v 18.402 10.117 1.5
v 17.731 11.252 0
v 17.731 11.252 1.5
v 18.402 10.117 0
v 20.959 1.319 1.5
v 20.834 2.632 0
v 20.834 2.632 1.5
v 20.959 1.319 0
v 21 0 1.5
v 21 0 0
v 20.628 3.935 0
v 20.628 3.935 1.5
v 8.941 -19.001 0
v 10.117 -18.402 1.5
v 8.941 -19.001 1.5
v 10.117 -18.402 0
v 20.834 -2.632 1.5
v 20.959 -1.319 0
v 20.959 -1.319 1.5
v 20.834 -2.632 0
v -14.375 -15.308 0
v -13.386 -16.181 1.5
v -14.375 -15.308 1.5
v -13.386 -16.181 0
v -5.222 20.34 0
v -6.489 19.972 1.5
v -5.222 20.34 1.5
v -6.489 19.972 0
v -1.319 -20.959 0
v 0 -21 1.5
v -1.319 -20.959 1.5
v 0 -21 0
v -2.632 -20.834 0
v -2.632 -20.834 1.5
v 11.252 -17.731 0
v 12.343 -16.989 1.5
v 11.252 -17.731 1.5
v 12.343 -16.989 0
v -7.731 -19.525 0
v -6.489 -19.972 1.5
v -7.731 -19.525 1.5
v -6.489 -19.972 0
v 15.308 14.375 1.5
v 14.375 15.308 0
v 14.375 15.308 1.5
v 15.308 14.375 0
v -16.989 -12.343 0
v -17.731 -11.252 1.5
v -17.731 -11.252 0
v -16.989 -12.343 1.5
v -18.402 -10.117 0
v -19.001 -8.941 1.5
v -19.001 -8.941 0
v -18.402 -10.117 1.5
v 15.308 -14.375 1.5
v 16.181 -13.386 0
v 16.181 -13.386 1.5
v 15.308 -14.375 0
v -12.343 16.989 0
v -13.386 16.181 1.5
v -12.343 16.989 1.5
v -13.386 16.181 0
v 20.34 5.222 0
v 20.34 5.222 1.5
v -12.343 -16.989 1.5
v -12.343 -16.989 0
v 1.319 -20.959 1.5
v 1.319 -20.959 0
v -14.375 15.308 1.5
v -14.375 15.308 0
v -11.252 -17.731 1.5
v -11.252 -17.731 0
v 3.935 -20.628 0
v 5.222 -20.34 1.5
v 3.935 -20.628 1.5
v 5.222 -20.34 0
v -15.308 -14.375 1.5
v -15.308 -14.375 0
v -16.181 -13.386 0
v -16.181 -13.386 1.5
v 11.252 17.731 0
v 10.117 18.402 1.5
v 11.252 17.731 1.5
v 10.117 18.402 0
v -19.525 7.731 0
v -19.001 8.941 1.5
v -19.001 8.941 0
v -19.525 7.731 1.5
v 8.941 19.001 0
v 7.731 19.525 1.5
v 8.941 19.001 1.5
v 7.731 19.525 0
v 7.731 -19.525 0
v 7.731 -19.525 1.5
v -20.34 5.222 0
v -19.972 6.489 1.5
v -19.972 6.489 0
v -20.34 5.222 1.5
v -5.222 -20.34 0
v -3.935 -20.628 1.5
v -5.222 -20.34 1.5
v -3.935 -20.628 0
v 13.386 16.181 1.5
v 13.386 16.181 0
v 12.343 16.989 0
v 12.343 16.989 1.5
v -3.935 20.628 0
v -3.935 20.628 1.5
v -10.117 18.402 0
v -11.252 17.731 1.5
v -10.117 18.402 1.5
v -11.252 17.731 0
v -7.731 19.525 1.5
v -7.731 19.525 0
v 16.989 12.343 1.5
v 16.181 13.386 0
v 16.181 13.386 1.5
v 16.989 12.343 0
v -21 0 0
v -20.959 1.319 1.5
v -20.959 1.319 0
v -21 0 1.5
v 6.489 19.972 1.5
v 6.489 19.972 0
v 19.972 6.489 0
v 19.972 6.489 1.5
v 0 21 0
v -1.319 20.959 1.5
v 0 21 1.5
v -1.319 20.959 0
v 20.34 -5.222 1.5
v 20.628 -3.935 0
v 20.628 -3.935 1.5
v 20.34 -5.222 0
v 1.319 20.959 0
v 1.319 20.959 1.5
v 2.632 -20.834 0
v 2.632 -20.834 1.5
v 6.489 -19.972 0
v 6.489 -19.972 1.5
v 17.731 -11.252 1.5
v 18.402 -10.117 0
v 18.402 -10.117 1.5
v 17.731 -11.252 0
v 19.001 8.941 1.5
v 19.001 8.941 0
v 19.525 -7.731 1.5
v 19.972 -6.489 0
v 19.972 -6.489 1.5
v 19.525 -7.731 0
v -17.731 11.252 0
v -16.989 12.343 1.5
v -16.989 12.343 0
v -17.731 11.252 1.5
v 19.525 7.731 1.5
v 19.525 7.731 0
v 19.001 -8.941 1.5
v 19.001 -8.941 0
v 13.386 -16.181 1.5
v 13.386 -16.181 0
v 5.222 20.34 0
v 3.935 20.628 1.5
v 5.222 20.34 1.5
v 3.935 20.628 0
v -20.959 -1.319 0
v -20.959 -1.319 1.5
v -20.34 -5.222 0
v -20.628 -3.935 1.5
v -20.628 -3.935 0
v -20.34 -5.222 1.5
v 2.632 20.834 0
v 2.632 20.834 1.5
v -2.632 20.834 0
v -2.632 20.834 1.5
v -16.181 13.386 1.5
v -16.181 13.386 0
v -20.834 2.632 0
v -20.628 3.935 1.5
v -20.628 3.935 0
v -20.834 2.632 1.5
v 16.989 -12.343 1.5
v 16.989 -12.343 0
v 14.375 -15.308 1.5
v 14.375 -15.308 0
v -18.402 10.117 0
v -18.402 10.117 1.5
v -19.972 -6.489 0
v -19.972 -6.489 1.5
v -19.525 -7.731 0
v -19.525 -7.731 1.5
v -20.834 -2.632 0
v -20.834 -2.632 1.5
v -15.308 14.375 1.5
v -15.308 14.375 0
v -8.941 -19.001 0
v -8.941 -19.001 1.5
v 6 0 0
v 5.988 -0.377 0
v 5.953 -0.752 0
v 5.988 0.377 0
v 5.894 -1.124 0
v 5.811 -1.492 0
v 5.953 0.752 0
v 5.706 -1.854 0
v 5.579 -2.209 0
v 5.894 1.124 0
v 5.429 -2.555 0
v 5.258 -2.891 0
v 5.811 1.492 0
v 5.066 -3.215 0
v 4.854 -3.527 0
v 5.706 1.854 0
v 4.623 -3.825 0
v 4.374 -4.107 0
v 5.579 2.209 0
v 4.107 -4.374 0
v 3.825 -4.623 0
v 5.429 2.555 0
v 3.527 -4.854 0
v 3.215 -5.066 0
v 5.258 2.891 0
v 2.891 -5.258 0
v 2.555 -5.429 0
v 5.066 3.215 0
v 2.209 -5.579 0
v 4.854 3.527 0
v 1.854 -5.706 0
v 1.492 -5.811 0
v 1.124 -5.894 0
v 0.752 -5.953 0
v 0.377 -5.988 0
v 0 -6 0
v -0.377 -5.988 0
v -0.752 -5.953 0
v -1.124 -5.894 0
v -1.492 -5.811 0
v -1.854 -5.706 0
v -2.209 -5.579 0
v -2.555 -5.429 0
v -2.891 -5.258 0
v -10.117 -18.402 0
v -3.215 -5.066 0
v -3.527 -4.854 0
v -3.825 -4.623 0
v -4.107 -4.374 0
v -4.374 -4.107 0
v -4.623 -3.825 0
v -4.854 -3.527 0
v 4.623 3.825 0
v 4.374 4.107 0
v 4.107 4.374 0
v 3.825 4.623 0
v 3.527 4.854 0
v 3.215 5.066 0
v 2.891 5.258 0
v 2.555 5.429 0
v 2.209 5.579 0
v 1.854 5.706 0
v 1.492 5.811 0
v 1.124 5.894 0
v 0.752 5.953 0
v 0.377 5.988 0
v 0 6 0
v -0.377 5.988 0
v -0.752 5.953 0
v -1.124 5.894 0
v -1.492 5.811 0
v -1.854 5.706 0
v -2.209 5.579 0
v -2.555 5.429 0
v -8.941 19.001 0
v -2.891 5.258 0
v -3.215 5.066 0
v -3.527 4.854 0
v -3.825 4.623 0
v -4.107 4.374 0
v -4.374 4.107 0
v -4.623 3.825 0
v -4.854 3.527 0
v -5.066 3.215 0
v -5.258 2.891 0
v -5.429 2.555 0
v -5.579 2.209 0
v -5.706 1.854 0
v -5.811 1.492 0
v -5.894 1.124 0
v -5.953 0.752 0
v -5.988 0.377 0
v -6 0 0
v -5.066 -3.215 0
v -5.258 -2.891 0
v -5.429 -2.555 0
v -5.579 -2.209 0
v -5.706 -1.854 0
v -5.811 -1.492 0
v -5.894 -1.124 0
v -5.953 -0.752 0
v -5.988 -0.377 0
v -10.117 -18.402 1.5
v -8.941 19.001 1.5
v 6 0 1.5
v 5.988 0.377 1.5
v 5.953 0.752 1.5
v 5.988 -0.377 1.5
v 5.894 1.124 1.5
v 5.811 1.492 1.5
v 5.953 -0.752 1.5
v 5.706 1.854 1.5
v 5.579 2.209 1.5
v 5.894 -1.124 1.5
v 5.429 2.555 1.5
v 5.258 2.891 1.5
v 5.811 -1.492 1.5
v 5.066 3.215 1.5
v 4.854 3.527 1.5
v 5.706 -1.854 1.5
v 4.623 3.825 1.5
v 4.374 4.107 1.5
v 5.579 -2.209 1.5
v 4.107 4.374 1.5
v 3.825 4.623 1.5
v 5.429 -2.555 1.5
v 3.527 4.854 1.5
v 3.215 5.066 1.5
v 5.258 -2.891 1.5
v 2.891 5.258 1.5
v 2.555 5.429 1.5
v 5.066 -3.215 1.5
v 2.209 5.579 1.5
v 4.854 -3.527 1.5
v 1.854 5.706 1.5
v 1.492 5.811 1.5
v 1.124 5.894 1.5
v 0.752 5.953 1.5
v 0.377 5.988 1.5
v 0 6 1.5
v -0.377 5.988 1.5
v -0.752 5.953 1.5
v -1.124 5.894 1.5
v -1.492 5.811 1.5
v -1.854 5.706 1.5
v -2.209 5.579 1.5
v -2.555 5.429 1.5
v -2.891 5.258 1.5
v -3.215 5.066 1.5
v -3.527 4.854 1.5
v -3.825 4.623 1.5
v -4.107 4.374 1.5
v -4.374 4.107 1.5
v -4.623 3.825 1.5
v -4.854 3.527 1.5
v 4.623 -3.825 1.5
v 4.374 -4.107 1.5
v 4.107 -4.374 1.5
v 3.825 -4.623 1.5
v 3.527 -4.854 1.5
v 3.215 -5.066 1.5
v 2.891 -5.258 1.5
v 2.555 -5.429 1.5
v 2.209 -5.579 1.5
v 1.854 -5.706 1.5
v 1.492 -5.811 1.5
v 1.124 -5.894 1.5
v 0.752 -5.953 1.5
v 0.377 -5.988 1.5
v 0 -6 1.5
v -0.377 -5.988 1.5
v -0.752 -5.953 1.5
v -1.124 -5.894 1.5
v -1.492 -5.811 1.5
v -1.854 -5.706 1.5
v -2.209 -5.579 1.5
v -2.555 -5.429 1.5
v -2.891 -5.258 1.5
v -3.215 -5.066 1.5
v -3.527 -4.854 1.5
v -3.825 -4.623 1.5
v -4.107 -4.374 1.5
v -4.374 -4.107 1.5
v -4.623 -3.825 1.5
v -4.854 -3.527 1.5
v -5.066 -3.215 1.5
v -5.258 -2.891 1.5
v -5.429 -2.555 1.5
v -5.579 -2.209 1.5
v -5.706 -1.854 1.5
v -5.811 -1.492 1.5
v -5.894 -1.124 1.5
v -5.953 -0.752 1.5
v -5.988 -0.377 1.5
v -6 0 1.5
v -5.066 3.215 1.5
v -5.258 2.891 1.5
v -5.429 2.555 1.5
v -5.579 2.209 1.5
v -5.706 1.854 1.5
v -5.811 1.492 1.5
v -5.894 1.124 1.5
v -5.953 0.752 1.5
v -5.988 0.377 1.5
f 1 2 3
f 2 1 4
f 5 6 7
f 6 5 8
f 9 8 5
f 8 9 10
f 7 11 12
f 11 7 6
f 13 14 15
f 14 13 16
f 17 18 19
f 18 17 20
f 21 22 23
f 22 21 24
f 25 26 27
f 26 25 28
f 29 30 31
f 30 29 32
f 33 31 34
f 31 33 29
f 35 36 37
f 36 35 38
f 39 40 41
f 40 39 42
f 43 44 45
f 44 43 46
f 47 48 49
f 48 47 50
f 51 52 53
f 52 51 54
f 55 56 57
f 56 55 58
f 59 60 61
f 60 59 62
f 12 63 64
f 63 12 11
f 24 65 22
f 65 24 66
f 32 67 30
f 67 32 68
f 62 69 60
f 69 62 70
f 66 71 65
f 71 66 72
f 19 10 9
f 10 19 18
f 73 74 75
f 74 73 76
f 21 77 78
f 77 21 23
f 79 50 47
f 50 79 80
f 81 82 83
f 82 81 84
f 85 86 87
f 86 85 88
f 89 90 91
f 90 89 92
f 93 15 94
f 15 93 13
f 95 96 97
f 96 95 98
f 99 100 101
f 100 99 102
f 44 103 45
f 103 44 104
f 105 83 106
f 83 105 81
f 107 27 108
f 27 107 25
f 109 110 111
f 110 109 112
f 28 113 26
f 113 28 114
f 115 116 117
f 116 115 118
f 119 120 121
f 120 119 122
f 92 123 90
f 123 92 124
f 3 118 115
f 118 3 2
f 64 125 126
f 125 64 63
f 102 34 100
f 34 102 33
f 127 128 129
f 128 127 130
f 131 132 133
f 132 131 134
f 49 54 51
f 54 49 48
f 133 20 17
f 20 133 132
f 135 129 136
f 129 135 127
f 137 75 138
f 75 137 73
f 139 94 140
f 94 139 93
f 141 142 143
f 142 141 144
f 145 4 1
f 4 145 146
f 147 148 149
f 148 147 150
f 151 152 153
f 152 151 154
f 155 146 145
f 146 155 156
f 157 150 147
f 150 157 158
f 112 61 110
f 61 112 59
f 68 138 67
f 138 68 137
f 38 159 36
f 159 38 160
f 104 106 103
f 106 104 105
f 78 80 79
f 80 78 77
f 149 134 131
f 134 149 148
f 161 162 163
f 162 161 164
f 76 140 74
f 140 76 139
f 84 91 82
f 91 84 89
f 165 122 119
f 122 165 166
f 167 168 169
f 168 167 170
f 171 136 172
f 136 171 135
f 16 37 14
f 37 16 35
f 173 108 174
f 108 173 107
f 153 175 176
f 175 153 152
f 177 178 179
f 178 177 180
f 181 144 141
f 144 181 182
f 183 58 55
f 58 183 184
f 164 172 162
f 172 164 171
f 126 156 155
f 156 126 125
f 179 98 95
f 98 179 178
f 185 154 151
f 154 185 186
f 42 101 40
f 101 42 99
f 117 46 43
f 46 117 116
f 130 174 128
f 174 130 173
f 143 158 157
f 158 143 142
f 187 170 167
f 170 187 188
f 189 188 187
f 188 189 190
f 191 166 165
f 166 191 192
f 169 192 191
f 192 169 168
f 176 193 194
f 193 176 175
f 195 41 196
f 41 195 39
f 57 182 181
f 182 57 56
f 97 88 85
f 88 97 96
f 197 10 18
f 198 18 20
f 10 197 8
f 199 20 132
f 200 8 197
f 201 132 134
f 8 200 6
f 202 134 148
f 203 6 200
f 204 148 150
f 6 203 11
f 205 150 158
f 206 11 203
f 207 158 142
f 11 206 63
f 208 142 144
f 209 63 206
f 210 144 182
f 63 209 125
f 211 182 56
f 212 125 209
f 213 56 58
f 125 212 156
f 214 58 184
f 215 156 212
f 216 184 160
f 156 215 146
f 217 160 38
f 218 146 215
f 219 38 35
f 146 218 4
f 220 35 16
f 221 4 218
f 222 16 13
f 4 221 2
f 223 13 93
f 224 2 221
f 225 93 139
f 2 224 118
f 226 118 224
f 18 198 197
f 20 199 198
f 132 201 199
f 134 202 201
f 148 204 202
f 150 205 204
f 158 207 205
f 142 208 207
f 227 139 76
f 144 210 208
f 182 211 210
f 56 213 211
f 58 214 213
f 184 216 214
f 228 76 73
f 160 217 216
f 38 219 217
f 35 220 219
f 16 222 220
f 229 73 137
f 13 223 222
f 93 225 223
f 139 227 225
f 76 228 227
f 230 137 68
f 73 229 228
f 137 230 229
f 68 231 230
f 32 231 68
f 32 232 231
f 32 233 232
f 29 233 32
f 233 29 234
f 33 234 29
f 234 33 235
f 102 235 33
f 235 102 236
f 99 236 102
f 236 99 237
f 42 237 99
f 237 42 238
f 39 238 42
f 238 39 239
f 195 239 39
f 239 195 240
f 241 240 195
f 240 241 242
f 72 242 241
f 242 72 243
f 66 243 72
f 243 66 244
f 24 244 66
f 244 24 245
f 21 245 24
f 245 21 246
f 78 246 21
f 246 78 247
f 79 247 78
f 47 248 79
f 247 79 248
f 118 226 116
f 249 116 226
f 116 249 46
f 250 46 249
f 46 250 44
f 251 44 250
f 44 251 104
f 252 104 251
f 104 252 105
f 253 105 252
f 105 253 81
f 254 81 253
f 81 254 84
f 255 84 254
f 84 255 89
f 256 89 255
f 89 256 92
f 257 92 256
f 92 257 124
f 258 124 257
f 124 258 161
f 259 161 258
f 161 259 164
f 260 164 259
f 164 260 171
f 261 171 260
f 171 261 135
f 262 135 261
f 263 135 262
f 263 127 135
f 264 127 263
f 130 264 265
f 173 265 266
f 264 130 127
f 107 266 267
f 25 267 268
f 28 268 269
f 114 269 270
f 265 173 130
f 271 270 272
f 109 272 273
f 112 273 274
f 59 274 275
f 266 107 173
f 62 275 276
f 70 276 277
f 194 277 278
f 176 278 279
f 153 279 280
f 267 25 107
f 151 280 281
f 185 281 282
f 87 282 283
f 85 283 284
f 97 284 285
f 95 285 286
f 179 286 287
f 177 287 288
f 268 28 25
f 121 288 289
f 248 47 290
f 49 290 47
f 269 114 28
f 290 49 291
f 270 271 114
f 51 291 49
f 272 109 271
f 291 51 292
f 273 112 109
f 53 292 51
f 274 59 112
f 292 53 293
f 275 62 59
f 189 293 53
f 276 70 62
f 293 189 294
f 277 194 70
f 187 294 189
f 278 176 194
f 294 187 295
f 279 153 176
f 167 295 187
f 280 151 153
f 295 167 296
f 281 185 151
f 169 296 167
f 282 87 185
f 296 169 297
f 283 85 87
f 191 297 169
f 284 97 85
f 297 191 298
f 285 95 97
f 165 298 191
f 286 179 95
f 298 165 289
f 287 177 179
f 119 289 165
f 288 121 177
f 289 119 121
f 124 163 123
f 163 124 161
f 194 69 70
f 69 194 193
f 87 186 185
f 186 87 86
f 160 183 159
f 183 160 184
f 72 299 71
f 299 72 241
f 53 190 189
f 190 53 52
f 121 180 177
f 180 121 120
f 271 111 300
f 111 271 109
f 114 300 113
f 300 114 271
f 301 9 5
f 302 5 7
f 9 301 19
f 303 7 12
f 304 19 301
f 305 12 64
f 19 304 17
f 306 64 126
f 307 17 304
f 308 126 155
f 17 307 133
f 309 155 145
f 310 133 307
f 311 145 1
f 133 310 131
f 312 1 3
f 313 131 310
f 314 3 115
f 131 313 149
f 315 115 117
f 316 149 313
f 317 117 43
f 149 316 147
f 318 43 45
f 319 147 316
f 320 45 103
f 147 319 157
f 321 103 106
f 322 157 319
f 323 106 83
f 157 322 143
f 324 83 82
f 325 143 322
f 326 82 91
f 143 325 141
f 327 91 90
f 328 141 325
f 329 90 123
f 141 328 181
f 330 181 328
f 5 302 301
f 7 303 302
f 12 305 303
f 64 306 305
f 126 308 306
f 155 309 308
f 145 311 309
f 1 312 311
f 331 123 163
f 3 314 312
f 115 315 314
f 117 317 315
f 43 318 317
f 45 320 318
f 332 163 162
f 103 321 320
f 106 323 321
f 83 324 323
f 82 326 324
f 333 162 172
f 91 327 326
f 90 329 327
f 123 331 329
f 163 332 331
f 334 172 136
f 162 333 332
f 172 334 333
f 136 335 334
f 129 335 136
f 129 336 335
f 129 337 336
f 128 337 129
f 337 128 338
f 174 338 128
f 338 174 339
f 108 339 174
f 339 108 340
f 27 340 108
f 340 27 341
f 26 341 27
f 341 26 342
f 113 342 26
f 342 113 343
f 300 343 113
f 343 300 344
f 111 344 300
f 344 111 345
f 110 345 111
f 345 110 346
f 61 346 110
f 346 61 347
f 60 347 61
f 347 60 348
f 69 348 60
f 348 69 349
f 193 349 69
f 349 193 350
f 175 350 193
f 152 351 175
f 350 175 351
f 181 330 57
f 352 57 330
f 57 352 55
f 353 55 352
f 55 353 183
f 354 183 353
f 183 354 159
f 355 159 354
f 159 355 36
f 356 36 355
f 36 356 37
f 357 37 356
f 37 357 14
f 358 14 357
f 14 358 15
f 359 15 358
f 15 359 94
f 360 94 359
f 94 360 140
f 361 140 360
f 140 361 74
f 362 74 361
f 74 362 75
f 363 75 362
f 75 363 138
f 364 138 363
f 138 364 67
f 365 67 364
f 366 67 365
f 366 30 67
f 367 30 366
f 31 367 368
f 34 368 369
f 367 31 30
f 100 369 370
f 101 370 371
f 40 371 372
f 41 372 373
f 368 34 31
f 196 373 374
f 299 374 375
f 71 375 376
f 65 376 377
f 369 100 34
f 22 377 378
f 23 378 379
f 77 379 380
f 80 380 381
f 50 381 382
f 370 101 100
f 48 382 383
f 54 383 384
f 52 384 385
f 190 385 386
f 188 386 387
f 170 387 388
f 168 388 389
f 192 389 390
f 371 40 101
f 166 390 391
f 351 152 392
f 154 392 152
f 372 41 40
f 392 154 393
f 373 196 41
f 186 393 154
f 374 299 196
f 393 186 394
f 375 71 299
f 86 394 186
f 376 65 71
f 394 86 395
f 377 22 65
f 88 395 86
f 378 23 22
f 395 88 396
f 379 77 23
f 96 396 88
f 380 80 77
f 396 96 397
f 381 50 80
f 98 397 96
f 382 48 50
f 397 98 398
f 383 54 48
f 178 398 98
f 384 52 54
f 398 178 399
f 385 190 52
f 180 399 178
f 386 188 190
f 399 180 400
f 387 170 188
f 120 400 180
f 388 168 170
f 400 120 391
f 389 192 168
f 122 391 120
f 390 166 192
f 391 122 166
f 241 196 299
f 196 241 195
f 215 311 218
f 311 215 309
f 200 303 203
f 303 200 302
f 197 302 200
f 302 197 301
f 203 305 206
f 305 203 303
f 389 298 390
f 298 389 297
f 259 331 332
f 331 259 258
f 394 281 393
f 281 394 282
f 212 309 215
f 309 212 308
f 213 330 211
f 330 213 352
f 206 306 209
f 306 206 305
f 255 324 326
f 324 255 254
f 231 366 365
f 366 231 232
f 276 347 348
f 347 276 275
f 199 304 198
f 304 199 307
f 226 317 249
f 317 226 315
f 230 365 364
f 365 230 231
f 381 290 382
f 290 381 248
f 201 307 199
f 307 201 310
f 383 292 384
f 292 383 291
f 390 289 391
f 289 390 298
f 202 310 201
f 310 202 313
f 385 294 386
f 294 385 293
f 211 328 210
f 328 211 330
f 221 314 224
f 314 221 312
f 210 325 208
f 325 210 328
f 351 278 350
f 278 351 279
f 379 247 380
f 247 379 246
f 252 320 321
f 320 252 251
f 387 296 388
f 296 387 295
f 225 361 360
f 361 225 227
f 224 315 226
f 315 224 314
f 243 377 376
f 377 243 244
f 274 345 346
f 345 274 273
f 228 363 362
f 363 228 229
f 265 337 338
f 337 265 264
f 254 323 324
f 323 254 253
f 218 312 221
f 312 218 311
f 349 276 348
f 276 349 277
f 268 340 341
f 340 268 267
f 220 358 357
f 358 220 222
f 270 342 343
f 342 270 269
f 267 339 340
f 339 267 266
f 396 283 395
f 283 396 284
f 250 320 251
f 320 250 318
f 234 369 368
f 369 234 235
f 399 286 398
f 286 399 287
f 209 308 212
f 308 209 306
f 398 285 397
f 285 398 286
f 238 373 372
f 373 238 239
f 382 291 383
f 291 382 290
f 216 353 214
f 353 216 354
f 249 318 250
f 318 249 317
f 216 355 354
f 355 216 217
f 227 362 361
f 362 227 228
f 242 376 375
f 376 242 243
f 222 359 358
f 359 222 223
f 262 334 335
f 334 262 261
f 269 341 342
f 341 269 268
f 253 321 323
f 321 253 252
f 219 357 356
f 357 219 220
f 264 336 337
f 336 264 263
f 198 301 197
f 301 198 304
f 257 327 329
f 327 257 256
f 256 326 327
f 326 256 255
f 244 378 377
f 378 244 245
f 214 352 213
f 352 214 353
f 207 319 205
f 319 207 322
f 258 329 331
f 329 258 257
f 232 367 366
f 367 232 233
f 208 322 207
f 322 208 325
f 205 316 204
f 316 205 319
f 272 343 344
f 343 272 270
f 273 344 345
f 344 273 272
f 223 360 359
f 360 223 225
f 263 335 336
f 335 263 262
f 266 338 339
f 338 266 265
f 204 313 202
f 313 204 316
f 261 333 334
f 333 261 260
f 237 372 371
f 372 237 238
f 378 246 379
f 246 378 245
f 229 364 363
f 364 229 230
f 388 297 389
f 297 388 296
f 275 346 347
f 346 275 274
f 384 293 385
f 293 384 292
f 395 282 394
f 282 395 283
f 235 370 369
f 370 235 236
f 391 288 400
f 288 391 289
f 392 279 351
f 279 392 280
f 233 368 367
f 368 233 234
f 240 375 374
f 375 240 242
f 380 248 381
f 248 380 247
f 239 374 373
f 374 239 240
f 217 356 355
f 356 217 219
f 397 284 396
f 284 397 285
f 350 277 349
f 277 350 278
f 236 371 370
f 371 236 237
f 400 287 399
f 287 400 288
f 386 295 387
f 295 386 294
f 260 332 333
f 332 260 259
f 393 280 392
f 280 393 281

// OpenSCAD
INNER_DIA = 12;
OUTER_DIA = 42;
THICKNESS = 1.5;

$fn = 100;

difference() {
    cylinder(d = OUTER_DIA, h = THICKNESS);
    cylinder(d = INNER_DIA, h = THICKNESS);
}
